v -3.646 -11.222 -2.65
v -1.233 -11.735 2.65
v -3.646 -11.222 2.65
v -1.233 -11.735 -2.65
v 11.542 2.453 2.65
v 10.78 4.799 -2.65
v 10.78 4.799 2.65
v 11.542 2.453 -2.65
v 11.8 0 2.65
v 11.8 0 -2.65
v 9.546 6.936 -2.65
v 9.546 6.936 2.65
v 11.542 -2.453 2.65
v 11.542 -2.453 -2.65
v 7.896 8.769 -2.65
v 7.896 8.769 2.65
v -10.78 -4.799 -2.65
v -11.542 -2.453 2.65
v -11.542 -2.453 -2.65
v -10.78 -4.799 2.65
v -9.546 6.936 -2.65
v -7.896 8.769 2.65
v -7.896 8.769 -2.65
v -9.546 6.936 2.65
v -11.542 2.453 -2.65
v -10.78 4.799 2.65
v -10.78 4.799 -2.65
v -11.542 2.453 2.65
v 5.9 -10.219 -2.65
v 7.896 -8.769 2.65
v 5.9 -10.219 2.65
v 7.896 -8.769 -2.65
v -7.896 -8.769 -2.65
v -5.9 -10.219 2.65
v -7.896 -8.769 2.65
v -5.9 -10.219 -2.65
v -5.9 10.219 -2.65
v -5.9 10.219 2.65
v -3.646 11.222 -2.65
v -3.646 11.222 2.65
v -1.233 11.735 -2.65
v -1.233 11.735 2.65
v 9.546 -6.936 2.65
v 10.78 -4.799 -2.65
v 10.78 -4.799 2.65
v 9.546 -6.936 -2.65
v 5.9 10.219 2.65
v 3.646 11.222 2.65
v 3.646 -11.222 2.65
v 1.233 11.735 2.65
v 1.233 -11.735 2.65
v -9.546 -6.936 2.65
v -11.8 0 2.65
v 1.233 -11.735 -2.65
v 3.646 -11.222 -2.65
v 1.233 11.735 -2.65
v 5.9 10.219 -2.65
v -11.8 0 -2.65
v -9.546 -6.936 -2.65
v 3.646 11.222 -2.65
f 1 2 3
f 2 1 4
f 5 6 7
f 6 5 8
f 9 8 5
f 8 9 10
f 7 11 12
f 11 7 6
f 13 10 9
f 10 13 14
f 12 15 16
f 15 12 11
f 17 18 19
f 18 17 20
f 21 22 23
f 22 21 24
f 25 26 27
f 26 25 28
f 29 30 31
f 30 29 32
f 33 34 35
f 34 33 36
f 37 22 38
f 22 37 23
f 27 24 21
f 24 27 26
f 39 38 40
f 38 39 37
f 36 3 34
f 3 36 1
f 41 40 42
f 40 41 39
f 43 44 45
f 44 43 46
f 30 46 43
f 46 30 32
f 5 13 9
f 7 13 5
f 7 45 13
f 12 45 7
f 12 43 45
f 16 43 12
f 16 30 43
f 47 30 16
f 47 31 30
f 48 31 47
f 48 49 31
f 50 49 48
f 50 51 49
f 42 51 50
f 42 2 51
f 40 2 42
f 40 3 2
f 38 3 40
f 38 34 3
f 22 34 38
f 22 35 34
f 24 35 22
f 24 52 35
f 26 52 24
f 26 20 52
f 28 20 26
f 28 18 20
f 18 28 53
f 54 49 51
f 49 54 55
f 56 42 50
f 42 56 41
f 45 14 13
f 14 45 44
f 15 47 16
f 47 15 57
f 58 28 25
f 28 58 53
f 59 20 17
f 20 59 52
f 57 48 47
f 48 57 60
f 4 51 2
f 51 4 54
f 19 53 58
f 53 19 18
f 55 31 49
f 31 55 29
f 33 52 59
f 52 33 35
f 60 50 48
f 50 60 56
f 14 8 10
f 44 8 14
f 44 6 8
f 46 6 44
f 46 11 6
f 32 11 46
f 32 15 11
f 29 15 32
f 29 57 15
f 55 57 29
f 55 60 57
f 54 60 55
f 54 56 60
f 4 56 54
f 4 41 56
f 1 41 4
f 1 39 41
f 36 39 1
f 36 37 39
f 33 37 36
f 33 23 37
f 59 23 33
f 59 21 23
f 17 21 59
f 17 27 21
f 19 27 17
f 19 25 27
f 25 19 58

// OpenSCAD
// Parameters
outer_radius = 10.8; //[5.4:21.6:0.1]
inner_radius = 10.8; //[5.4:21.6:0.1]
height = 5.3; //[2.65:10.6:0.1]
thickness = 1.0; //[0.5:2.0:0.1]
overlap = 0.8; //[0.5:2.0:0.1]

// Main radial feature
module radial_main_profile() {
  color("Silver")
  cylinder(r=outer_radius, h=height, center=true);
}

// Radial step outer cylinder
module radial_step_outer_cyl() {
  color("DimGray")
  cylinder(r=outer_radius + thickness, h=height, center=true);
}

// Radial step inner cylinder
module radial_step_inner_cyl() {
  color("Black")
  cylinder(r=outer_radius - overlap, h=height + overlap*2, center=true);
}

// Radial step or wall
module radial_step_or_wall() {
  difference() {
    radial_step_outer_cyl();
    radial_step_inner_cyl();
  }
}

// Complete radial feature
module radial_feature_complete() {
  union() {
    radial_main_profile();
    radial_step_or_wall();
  }
}

// Final output
radial_feature_complete();
